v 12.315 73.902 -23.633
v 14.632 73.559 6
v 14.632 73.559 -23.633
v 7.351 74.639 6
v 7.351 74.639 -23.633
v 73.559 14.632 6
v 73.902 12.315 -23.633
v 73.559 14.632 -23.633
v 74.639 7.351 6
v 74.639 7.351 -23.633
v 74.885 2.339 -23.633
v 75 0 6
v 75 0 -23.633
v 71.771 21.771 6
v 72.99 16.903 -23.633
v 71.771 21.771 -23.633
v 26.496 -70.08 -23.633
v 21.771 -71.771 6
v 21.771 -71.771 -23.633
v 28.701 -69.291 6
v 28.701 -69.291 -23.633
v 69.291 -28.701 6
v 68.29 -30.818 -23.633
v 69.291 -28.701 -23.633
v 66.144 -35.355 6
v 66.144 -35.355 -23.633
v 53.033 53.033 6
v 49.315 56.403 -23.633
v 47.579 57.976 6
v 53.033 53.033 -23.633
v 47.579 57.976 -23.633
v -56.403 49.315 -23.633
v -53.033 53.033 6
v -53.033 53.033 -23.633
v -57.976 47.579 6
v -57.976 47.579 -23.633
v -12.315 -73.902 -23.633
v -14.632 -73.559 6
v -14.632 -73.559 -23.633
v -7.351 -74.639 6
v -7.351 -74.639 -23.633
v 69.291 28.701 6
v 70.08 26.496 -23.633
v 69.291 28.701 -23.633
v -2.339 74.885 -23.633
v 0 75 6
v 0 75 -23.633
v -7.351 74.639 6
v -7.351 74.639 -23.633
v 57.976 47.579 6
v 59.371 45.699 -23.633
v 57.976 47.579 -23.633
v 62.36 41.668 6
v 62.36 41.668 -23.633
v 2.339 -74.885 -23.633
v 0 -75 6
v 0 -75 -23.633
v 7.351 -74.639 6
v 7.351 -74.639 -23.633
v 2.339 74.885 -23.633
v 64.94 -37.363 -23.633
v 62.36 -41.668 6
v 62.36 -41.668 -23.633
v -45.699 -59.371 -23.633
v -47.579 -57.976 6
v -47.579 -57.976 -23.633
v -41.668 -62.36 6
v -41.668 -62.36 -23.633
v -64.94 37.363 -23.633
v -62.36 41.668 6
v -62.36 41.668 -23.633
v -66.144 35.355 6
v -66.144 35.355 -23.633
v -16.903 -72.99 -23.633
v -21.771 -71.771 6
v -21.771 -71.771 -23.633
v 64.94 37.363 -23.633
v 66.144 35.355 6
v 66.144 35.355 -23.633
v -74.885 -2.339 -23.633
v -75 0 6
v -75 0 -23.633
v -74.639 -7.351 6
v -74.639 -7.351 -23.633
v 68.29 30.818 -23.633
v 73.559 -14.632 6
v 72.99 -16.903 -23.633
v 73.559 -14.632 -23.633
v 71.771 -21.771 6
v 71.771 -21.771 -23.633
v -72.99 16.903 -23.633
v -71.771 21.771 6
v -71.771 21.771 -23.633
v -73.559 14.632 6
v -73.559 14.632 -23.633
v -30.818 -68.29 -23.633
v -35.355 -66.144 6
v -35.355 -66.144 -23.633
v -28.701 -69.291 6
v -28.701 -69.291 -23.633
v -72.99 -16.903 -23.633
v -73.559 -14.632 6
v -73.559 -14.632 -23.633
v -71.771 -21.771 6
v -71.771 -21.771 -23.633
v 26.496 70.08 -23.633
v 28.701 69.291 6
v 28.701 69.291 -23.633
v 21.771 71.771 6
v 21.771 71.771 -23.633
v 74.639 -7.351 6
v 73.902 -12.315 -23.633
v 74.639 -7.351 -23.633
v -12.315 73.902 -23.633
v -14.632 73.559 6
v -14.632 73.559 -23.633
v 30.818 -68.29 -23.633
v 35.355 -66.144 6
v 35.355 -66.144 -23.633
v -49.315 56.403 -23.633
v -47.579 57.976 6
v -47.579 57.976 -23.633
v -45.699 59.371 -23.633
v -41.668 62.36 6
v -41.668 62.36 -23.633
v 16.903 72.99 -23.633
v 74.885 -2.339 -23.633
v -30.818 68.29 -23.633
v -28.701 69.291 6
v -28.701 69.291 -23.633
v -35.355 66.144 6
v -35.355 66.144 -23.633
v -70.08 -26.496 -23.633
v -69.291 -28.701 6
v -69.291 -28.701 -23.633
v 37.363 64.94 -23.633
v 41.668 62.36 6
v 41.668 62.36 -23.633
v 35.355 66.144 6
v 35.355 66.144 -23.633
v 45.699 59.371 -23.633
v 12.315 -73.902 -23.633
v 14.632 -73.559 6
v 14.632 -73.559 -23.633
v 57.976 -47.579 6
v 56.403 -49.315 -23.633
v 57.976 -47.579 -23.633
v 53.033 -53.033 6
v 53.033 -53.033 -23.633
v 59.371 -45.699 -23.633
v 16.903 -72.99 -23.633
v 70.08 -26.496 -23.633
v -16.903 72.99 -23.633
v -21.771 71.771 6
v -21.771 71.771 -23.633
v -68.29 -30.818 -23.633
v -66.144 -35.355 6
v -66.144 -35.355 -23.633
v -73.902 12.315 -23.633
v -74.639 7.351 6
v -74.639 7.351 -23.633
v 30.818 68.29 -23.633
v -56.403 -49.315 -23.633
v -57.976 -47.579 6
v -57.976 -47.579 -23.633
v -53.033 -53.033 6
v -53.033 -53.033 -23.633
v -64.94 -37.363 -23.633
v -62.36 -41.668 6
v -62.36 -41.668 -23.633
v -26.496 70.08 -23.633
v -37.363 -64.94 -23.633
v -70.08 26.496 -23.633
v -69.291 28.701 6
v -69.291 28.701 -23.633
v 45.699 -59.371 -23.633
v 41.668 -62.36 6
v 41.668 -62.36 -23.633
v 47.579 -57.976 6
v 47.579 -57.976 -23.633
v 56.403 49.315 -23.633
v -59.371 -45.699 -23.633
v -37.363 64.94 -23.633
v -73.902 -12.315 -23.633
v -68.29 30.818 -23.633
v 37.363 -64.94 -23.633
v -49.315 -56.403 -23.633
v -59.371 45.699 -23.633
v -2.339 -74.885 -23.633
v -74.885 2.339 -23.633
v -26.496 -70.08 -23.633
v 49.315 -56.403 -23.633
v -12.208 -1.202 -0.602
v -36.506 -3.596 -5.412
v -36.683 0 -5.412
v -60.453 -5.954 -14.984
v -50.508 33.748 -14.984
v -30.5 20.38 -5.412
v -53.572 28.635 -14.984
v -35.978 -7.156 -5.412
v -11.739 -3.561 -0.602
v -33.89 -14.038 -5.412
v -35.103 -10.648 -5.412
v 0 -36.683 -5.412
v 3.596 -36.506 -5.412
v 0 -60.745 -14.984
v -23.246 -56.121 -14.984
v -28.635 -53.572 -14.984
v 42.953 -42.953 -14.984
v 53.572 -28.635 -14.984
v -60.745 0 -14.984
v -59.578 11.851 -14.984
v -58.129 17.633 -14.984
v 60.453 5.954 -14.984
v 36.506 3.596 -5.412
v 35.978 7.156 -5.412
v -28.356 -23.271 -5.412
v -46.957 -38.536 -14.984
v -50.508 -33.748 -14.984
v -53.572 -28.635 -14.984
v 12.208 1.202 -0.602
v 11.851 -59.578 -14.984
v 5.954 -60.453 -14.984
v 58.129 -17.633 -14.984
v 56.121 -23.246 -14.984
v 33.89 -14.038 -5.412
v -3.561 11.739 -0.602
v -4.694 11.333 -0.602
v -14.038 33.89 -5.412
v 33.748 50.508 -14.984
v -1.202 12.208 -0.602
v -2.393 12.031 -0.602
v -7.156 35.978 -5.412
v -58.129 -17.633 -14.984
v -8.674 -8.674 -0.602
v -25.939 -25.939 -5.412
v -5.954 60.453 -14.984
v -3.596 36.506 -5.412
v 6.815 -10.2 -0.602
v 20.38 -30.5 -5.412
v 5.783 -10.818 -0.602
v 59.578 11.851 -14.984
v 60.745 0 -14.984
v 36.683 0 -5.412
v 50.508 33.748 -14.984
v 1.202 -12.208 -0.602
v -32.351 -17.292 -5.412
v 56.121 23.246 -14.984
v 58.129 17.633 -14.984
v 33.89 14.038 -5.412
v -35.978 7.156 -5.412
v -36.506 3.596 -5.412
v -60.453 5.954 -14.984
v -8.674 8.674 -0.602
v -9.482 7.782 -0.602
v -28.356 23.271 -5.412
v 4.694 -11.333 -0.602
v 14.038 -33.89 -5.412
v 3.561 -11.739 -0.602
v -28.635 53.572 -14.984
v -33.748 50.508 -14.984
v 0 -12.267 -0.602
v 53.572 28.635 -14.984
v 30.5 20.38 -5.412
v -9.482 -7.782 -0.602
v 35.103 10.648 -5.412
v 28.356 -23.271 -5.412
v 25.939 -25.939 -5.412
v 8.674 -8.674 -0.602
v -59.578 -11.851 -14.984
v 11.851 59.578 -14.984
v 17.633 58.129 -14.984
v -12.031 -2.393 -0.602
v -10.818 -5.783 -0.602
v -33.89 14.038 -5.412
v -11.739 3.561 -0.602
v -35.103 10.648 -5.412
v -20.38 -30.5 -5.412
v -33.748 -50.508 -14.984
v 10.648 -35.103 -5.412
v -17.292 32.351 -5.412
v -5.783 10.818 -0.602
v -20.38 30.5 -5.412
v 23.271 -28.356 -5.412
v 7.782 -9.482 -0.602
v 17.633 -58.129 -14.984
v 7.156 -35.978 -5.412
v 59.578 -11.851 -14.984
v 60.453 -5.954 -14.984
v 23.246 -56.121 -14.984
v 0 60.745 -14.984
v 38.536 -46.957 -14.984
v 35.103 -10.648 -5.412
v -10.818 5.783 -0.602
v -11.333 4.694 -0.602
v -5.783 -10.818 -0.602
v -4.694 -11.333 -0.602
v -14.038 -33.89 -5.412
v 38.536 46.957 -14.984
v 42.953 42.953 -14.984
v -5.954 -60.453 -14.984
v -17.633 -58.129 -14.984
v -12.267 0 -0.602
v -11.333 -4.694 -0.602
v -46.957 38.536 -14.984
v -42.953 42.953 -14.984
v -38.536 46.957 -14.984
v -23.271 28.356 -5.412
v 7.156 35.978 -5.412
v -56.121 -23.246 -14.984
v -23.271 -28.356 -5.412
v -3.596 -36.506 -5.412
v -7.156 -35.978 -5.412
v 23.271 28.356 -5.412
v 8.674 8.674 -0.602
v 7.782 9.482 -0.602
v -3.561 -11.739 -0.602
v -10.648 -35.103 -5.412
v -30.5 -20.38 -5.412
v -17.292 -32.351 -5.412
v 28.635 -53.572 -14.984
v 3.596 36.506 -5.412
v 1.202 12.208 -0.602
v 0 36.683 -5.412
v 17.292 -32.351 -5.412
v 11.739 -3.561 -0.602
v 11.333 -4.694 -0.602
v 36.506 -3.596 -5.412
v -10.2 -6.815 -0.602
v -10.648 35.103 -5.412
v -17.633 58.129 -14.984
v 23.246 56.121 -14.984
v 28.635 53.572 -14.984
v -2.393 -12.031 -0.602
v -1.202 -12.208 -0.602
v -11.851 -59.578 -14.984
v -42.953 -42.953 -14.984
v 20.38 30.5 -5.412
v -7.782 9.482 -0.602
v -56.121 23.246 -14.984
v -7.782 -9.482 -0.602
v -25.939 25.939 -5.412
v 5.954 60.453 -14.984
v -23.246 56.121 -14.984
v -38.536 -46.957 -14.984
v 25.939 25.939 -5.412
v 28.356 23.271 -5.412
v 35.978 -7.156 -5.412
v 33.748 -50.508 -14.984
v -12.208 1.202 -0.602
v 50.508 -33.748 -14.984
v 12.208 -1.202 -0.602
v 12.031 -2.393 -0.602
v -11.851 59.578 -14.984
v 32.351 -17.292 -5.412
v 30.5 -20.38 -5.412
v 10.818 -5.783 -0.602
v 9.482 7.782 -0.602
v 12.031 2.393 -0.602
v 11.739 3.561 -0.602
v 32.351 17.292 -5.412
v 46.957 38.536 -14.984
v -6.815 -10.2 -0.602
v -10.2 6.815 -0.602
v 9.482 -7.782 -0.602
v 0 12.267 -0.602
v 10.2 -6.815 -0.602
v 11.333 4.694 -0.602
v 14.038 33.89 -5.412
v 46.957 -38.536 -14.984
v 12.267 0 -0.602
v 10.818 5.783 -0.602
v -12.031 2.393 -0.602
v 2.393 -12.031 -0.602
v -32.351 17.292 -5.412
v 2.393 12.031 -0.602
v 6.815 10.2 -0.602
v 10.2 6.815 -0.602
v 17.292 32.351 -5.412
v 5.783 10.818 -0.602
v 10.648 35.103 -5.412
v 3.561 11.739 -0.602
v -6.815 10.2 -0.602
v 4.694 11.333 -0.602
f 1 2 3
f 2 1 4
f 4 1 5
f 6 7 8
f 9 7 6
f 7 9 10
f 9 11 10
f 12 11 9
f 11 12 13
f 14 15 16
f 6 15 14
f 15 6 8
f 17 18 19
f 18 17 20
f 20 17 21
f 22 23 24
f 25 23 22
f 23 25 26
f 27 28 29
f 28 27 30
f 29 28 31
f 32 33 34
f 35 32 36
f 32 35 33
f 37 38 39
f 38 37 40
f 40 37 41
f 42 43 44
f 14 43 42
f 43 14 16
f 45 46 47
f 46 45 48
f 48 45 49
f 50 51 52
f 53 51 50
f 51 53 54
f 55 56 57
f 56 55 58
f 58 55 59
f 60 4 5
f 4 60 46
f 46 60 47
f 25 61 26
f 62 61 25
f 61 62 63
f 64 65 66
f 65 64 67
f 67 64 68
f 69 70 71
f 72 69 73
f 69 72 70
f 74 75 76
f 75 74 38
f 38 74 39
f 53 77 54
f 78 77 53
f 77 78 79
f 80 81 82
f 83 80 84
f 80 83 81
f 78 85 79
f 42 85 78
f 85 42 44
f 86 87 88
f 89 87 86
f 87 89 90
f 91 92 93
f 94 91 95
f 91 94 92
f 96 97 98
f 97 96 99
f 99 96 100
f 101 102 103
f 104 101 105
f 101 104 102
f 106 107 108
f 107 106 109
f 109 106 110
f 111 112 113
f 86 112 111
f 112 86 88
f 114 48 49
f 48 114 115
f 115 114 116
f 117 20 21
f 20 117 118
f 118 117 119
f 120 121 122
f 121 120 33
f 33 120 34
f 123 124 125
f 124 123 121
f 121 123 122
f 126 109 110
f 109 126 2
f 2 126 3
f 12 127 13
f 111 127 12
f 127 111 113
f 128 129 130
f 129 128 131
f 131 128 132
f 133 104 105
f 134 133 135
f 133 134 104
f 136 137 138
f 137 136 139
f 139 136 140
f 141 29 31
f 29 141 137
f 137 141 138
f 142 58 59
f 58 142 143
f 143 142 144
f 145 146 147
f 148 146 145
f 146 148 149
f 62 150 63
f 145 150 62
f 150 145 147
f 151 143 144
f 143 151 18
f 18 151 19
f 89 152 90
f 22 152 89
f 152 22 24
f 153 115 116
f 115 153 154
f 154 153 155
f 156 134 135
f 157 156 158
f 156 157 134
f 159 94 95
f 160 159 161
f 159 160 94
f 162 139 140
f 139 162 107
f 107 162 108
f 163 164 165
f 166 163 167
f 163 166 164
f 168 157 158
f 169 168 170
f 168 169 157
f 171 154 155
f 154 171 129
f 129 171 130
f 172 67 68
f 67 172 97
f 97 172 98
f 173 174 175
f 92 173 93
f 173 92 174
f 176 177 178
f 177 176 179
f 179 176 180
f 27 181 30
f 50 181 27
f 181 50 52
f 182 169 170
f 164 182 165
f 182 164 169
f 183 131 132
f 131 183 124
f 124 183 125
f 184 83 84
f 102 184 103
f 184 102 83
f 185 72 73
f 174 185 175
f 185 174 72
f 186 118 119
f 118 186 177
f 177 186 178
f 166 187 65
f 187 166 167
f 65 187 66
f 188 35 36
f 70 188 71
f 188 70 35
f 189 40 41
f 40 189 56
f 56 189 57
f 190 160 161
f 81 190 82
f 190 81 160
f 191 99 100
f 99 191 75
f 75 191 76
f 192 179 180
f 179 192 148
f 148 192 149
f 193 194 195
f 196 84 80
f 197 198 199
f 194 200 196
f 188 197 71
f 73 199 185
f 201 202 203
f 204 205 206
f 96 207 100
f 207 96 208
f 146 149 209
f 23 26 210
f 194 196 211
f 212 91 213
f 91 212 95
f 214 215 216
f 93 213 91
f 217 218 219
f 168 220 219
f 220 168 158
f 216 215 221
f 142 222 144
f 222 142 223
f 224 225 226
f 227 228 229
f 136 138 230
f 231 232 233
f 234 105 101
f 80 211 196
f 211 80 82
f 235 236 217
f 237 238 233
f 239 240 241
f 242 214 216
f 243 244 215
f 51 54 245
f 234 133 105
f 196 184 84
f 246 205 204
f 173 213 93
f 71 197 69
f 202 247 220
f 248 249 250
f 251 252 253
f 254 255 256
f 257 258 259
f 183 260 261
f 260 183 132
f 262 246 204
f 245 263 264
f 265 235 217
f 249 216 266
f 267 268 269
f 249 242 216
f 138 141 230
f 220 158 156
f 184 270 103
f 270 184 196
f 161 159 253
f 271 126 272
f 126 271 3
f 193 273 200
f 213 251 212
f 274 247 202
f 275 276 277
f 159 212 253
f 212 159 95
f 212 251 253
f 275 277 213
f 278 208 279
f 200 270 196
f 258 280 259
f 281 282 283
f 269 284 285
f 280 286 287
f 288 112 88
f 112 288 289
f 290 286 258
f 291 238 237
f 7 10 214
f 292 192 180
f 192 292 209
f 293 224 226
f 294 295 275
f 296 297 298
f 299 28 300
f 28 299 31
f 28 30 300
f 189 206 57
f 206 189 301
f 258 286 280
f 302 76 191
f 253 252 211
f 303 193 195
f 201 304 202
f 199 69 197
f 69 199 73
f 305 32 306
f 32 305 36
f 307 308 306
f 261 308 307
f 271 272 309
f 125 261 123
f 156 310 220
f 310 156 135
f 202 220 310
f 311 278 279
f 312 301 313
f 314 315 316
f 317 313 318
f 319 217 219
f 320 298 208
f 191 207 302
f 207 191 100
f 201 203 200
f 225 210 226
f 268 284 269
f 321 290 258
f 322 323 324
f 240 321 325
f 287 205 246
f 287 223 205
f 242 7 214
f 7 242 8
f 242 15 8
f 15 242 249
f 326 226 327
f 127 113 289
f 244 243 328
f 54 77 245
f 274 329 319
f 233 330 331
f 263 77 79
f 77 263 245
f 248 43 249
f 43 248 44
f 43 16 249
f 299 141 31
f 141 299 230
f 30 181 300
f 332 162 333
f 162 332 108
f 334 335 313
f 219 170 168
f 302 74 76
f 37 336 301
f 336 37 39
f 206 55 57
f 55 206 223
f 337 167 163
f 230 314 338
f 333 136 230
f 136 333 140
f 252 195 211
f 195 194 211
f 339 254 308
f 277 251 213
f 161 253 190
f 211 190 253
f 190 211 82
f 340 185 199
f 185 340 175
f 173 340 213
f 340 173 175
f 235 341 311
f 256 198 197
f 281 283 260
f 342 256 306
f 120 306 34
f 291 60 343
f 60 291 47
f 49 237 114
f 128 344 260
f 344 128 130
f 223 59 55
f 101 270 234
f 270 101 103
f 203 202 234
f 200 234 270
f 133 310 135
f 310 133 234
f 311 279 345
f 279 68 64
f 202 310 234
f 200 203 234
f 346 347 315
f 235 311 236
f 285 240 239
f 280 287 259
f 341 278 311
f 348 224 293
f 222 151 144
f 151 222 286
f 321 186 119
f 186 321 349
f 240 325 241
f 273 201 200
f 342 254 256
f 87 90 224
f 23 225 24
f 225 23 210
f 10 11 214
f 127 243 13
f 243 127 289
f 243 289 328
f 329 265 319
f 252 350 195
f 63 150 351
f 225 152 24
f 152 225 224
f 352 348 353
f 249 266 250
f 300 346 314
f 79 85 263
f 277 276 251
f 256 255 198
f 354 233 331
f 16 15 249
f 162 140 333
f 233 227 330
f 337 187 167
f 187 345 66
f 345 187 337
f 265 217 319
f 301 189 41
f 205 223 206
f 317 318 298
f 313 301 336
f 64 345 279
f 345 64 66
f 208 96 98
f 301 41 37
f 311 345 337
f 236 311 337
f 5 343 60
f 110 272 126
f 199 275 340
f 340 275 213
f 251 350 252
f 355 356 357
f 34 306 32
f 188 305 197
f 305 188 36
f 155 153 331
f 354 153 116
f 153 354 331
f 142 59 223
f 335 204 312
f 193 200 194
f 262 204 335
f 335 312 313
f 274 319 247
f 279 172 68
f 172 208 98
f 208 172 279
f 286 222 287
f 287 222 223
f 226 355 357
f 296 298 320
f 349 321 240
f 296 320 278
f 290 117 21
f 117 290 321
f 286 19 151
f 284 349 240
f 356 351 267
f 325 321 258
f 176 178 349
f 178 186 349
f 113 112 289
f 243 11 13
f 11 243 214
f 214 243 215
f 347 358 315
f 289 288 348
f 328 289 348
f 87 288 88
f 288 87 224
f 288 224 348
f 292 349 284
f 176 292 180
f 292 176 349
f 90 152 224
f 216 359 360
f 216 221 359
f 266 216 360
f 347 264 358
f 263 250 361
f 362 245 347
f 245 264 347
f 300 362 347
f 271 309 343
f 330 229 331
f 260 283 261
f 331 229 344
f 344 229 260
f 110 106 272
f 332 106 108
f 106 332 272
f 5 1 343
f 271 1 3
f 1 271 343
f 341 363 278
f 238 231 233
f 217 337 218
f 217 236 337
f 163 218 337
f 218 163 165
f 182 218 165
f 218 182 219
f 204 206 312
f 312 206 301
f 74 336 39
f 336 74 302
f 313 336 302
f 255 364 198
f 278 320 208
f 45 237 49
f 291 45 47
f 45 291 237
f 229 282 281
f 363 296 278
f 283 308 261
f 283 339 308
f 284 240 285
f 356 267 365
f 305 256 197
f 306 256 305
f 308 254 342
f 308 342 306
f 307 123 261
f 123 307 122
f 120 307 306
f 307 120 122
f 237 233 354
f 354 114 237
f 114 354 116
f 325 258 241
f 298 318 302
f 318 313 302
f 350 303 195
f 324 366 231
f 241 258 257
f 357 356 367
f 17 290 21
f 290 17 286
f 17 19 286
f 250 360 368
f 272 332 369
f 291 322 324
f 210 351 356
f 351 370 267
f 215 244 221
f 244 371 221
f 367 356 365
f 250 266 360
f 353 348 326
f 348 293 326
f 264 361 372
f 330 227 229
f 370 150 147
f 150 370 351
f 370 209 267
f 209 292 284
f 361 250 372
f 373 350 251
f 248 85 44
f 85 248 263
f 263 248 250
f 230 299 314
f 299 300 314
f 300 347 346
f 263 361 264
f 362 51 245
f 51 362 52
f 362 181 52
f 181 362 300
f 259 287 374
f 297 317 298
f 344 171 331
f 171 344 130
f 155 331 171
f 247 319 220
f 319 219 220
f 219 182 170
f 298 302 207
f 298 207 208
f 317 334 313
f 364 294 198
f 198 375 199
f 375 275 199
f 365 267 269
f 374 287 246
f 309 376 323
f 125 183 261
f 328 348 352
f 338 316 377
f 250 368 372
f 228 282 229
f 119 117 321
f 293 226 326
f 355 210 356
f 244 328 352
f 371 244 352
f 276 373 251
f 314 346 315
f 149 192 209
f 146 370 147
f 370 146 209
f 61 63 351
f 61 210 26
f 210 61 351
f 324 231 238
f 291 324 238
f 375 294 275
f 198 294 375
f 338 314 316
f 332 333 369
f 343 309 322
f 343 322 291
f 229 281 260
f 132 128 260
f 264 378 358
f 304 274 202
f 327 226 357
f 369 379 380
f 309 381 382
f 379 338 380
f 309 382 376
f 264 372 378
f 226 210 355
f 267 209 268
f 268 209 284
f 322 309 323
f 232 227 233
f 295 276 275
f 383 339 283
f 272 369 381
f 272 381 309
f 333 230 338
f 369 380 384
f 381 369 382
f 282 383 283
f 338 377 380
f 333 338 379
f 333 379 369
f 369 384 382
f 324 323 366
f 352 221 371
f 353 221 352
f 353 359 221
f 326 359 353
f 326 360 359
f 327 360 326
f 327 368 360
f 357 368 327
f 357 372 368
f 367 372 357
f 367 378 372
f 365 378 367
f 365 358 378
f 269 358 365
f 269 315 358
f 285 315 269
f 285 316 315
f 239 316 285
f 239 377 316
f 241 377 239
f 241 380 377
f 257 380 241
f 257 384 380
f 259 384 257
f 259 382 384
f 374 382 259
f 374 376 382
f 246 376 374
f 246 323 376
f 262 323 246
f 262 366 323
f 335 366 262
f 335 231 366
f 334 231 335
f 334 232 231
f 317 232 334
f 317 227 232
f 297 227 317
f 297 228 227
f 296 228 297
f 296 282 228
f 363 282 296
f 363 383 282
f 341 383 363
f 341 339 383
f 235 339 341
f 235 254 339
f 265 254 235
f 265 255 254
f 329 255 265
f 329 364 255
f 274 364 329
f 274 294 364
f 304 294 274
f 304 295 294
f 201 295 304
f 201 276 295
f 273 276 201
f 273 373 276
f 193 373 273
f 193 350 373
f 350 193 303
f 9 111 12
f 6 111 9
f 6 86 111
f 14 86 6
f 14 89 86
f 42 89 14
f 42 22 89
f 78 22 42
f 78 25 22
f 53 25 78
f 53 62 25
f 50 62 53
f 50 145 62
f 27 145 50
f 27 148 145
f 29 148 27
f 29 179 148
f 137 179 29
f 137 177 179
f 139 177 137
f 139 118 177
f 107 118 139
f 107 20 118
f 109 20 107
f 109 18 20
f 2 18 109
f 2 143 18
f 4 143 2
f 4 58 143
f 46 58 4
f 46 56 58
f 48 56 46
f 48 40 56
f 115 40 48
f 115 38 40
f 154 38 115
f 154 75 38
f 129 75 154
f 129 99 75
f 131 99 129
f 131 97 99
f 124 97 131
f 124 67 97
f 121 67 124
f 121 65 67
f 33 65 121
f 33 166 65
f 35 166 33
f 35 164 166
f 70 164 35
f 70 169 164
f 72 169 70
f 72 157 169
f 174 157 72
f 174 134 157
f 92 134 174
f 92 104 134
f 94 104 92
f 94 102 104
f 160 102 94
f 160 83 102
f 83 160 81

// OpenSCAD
$fn = 64;

disc_height = 50;
surface_radius = 500;
medal_diameter = 300; // Contrained by image size of icon. Actual size (58 mm) must be set in slicer.
edge_chamfer = 10;


module base () {
    difference () {
        cylinder_height = 100; // Real height is constrained by curvature of recess below it
        height_above_0 = 1; // For unioning it
        translate([0,0, -cylinder_height + height_above_0]) 
            cylinder(h = cylinder_height, d = medal_diameter, center = false);
        translate([0,0, -surface_radius]) 
            sphere(r = surface_radius);
    }
}


// Chamfer instead of rounded edge for better printability
module emblem () {
    emblem_height = 10;
    chamfer_offset = 6;
    
    union () {
        translate([0, 0, chamfer_offset]) intersection() {
            translate([0, 0, 5])
                scale([1, 1, 0.05])
                surface(file = "surface@2x.png", center = true, invert = true);
//            // For debugging:
//            translate([0, 0, 2.5])
//                cube([400, 400, 5], center = true);
            cylinder(
                h = emblem_height-chamfer_offset,
                d1 = medal_diameter,
                d2 = medal_diameter - (2 * (emblem_height - chamfer_offset)),
                center = false
            );
        }       
        cylinder(h = chamfer_offset, d = medal_diameter, center = false);
    }
}


scale([0.5, 0.5, 1]) // Make it easier to handle. Exact size is set in slicer.
union () {
    emblem();
    base();
}
